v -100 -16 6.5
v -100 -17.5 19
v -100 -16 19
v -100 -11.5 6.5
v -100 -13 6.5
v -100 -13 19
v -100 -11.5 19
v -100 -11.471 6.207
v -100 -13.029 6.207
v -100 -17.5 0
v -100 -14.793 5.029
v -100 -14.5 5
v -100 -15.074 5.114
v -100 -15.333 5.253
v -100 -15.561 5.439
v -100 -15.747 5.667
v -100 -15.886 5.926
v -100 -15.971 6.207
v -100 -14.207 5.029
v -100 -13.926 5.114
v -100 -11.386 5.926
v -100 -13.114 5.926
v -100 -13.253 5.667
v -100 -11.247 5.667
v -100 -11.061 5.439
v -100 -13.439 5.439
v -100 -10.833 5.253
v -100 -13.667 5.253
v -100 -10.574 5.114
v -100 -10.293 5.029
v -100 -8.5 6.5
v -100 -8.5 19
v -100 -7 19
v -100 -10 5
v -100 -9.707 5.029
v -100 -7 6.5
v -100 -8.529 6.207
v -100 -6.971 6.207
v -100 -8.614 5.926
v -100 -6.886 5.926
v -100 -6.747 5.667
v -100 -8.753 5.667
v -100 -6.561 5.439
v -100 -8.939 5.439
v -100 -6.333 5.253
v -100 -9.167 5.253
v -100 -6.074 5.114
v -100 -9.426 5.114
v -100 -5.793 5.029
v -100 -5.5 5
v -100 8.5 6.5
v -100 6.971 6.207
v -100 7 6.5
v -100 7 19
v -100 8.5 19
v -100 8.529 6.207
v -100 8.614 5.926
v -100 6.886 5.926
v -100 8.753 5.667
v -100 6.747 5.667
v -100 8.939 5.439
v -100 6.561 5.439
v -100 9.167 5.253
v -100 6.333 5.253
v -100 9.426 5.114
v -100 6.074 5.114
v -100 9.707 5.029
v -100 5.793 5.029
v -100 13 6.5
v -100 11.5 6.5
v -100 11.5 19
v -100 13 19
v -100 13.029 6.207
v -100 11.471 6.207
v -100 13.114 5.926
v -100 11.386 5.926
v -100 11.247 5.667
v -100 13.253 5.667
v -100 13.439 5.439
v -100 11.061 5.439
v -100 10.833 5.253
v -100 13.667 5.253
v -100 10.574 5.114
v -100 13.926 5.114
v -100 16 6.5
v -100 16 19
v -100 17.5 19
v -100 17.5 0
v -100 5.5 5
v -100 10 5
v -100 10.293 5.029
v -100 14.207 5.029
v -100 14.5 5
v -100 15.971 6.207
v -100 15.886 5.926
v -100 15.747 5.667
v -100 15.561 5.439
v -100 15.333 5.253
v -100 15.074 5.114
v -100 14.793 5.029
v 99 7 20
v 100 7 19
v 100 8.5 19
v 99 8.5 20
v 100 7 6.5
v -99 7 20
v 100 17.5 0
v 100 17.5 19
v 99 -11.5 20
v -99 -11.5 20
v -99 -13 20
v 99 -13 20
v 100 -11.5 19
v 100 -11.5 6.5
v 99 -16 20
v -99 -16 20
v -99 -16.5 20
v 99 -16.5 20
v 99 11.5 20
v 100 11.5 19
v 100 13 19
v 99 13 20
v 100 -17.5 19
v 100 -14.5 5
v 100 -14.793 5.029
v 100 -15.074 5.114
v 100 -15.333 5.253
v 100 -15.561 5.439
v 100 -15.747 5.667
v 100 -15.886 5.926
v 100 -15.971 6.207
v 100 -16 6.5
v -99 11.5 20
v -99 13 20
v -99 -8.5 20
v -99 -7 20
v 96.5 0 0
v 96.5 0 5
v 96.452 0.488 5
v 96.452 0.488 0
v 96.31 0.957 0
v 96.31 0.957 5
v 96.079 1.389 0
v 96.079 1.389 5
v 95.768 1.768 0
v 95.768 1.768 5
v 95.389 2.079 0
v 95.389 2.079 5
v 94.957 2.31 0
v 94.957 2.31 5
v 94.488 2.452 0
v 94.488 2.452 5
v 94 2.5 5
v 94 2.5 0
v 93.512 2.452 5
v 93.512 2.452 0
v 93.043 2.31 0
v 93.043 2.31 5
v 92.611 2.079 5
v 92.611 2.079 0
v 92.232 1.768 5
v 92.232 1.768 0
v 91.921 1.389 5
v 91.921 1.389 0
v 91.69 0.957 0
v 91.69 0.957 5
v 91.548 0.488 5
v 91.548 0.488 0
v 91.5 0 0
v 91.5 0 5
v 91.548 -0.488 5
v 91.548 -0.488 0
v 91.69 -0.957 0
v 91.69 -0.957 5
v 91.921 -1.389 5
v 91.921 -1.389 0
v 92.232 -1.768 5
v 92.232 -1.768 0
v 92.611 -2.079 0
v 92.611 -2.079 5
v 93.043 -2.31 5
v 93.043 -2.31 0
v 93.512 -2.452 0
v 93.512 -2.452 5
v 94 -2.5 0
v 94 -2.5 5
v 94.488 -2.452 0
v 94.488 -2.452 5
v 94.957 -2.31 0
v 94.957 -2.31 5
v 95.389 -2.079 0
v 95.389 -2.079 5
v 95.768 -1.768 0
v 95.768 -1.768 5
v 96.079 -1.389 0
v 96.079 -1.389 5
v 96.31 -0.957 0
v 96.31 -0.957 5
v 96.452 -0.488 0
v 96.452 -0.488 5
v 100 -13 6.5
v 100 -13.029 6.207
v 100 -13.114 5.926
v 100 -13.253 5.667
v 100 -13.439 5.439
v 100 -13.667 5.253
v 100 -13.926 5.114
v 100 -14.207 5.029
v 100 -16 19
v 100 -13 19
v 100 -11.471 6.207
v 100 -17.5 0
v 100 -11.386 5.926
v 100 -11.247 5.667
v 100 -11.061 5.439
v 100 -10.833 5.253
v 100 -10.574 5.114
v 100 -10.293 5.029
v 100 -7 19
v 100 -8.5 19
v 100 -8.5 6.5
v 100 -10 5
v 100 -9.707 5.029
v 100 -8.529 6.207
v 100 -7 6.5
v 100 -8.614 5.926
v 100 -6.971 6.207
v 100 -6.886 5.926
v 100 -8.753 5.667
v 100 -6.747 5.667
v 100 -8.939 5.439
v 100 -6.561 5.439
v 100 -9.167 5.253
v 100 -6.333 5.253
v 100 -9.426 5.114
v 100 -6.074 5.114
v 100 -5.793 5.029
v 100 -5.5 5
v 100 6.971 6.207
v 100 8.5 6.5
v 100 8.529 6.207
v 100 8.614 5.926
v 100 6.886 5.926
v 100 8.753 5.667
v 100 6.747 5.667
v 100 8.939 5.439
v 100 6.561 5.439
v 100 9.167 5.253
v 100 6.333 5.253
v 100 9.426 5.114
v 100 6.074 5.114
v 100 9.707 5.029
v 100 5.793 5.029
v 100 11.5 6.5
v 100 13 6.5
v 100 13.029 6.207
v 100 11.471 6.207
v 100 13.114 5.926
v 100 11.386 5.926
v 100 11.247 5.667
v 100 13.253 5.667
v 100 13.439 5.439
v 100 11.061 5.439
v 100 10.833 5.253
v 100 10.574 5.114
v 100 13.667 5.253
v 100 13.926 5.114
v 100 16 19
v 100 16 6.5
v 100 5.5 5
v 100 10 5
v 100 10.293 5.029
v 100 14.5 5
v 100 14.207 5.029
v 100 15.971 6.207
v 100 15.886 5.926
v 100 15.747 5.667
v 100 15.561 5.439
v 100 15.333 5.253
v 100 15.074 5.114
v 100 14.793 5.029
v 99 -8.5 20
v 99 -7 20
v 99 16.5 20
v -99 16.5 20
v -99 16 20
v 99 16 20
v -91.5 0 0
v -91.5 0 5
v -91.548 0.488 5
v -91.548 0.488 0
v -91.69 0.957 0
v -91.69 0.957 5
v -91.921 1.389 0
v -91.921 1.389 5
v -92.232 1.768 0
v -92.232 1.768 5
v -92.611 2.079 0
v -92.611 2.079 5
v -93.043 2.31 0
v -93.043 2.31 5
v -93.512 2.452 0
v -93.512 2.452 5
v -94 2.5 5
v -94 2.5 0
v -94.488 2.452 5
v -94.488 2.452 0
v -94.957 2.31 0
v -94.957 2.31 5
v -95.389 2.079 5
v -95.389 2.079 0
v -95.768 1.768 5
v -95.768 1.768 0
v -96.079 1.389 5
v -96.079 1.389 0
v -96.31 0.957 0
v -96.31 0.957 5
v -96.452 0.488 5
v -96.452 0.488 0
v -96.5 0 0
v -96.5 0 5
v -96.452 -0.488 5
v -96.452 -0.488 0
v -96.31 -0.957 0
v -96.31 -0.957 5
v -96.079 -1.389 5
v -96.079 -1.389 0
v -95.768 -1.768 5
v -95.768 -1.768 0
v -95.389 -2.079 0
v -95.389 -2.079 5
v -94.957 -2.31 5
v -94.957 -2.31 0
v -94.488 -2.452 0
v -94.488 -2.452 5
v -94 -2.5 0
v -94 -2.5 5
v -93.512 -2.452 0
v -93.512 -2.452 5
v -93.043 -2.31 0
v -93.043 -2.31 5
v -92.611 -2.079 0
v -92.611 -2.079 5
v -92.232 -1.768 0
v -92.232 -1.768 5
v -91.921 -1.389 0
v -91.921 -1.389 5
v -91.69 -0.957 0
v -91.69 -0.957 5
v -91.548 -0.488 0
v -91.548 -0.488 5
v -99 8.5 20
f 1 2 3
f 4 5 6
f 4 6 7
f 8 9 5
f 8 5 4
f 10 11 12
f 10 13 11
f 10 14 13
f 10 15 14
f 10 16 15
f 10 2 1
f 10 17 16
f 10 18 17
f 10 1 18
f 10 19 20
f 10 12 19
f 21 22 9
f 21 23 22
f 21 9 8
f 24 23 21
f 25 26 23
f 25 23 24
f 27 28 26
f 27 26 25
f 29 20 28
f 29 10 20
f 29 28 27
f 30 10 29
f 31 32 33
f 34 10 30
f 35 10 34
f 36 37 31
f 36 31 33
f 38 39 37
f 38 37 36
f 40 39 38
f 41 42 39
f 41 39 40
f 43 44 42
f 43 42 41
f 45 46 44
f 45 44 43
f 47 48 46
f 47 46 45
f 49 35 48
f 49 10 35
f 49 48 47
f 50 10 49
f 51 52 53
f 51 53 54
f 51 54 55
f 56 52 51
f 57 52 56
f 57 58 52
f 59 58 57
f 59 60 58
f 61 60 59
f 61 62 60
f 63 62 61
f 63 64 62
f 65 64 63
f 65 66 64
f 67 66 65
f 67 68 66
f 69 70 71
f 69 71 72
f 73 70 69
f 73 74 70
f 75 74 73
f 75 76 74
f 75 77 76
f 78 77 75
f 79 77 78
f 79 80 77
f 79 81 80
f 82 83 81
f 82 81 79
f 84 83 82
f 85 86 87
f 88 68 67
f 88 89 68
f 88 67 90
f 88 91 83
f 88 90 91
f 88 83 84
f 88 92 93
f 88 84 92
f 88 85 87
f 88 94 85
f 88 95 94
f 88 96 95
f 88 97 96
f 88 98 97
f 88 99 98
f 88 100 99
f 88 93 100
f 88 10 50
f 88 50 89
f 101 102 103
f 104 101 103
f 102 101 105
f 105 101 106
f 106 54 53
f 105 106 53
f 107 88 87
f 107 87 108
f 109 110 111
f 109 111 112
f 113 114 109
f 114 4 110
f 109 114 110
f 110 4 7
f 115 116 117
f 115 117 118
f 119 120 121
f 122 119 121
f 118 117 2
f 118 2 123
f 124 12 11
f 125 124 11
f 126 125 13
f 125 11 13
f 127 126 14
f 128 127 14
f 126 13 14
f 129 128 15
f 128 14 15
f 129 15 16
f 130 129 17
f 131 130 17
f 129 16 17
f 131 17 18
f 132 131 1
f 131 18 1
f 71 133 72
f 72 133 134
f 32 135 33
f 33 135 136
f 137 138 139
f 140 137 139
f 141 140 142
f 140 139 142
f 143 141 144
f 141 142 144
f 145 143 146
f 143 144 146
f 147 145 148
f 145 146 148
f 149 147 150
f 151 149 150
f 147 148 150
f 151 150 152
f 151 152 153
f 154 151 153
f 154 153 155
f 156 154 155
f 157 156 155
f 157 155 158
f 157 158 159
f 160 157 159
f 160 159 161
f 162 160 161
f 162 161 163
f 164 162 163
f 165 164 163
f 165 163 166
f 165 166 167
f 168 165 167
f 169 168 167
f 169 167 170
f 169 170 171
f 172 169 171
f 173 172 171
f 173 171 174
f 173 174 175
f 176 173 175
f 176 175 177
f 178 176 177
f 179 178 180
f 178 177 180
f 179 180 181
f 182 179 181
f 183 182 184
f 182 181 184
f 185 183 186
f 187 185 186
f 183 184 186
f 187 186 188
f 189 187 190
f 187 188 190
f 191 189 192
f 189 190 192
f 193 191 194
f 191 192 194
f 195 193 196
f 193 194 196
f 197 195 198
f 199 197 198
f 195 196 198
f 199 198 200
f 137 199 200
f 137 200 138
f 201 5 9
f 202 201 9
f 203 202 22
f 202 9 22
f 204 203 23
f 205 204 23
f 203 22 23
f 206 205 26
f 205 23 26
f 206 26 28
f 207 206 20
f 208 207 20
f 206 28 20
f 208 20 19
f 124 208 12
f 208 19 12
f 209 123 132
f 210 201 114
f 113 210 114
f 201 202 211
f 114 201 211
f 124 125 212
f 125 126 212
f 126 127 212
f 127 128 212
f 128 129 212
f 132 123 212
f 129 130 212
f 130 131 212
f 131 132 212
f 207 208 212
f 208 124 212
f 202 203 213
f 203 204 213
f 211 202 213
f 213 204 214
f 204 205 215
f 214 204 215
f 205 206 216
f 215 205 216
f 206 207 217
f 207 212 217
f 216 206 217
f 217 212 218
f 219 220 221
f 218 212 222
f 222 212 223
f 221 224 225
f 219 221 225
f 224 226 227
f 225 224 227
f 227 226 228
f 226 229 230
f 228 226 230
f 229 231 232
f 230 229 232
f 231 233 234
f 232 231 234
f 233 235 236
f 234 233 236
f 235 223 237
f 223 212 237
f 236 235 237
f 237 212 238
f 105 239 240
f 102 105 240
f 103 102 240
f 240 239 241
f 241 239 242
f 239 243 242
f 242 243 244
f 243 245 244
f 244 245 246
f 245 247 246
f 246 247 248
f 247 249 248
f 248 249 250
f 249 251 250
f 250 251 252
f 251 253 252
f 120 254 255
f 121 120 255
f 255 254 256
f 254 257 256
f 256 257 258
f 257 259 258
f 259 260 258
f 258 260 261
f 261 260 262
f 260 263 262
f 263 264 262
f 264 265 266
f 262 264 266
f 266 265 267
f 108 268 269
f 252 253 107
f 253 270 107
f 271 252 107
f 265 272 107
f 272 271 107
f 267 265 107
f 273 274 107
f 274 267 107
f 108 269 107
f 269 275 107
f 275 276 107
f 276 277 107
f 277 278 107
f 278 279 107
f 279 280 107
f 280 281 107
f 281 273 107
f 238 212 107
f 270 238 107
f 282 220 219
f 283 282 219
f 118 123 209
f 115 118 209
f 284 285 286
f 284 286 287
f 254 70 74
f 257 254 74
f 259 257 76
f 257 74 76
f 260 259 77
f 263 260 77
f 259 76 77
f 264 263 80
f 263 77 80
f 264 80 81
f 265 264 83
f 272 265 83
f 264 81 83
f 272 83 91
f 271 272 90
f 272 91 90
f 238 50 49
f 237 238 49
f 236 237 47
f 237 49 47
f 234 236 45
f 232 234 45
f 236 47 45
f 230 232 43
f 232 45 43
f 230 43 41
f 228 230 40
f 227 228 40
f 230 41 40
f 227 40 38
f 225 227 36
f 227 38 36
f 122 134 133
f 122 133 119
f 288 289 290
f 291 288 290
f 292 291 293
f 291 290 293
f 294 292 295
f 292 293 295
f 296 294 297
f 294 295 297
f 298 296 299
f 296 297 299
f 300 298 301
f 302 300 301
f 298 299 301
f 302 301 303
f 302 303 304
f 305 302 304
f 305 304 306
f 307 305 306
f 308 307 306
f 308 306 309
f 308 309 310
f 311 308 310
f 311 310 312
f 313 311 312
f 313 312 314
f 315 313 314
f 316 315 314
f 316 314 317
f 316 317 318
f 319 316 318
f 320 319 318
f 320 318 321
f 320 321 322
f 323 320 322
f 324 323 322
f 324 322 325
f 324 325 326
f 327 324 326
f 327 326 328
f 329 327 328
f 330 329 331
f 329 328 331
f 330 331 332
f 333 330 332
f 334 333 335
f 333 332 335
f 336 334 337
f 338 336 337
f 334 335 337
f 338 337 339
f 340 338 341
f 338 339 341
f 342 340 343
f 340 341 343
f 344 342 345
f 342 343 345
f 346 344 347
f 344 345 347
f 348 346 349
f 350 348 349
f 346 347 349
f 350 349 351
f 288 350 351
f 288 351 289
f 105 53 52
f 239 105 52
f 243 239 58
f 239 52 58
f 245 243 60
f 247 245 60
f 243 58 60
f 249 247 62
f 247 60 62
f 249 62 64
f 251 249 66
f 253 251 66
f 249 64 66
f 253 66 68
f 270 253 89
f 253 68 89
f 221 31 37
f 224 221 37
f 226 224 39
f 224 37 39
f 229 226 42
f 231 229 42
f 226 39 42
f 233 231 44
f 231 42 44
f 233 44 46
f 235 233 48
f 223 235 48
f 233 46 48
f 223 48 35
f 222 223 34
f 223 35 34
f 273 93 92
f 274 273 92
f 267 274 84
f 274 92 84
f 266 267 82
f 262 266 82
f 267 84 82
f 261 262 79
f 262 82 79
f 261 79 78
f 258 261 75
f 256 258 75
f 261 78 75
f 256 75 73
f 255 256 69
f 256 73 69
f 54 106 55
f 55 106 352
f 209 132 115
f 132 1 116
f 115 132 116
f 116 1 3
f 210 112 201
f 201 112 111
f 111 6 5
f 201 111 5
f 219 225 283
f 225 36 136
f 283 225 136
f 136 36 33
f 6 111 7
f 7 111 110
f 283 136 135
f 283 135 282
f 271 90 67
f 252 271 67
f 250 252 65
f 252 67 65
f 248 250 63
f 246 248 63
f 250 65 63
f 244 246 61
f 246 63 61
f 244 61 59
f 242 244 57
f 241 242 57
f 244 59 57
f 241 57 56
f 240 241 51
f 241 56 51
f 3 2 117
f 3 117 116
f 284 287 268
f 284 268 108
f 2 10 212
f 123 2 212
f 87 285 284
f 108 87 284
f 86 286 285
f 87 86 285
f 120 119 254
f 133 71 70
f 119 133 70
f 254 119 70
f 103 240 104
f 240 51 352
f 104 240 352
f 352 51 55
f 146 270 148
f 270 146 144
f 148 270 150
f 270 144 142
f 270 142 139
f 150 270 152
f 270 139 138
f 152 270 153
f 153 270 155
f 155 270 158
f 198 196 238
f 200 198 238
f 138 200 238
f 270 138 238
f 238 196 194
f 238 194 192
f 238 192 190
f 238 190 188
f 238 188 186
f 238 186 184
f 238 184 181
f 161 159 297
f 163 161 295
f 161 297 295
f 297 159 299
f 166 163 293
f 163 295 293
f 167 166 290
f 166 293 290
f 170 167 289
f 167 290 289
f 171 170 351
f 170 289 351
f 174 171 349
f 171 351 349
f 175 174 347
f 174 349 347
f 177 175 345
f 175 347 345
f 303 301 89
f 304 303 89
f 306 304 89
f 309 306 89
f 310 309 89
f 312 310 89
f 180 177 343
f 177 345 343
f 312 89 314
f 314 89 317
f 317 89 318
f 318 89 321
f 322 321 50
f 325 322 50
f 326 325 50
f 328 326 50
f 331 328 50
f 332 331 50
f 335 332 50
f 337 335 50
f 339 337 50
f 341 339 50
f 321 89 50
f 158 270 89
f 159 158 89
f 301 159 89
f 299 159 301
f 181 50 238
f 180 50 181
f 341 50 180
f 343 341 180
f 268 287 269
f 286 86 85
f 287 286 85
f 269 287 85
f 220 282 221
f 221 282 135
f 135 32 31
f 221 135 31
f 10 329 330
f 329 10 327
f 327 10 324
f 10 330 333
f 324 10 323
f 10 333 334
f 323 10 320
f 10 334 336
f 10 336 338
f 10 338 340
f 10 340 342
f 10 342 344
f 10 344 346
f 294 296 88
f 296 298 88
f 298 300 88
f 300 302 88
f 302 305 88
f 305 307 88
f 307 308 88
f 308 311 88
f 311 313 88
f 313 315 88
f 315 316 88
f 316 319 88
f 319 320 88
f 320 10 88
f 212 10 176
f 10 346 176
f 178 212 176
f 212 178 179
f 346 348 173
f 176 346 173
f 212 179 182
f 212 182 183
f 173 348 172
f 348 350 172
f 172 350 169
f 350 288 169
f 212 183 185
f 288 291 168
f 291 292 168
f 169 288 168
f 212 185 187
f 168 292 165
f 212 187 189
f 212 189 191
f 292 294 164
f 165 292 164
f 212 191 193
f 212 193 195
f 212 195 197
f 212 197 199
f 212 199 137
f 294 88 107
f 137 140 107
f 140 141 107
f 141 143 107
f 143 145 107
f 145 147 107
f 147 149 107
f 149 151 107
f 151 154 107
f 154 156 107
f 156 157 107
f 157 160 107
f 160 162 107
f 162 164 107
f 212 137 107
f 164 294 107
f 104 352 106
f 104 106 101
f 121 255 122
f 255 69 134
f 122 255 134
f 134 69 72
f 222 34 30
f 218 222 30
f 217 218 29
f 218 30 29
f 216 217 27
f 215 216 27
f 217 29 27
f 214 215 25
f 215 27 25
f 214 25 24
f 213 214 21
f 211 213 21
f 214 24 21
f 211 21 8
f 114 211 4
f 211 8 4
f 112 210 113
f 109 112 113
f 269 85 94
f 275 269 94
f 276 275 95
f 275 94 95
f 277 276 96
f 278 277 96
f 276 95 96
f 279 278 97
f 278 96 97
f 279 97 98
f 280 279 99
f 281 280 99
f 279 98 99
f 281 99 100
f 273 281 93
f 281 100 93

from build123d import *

# Parameters (mm, degrees)
F0_W     = 200
F0_H     = 35
F1_DEPTH = 20
F2_R     = 2.5
F3_DEPTH = 25
F4_SIZE  = 1
F6_DEPTH = 240
F8_DEPTH = 250


with BuildPart() as f1:
    # F0 (on Top) → F1 (new body)
    with BuildSketch(Plane.XY):
        Rectangle(F0_W, F0_H)
    extrude(amount=F1_DEPTH)

    # F2 (on face) → F3 (cut)
    with BuildSketch(Plane.XY.offset(20)):
        with Locations((-94, 0)):
            Circle(F2_R)
        with Locations((94, 0)):
            Circle(F2_R)
    extrude(amount=-F3_DEPTH, mode=Mode.SUBTRACT)

    # F4
    f4_edges = [f1.edges().sort_by_distance(p)[0] for p in [
        (0, 17.5, 20),
        (100, 0, 20),
        (-100, 0, 20),
        (0, -17.5, 20),
        (-96.5, 0, 20),
        (91.5, 0, 20),
    ]]
    chamfer(f4_edges, length=F4_SIZE)

    # F5 (on face) → F6 (cut)
    with BuildSketch(Plane(origin=(-100, 0, 0), x_dir=(0, -1, 0), z_dir=(-1, 0, 0))):
        with BuildLine():
            Line((-13, 21.054447), (-16, 21.054447))
            Line((-16, 21.054447), (-16, 6.5))
            ThreePointArc((-16, 6.5), (-15.56066, 5.43934), (-14.5, 5))
            ThreePointArc((-14.5, 5), (-13.43934, 5.43934), (-13, 6.5))
            Line((-13, 6.5), (-13, 21.054447))
        make_face()
        with BuildLine():
            Line((-8.5, 21.054447), (-11.5, 21.054447))
            Line((-11.5, 21.054447), (-11.5, 6.5))
            ThreePointArc((-11.5, 6.5), (-11.06066, 5.43934), (-10, 5))
            ThreePointArc((-10, 5), (-8.93934, 5.43934), (-8.5, 6.5))
            Line((-8.5, 6.5), (-8.5, 21.054447))
        make_face()
        with BuildLine():
            Line((-4, 20.95042), (-7, 20.95042))
            Line((-7, 20.95042), (-7, 6.5))
            ThreePointArc((-7, 6.5), (-6.56066, 5.43934), (-5.5, 5))
            ThreePointArc((-5.5, 5), (-4.43934, 5.43934), (-4, 6.5))
            Line((-4, 6.5), (-4, 20.95042))
        make_face()
        with BuildLine():
            Line((11.5, 21.002434), (8.5, 21.002434))
            Line((8.5, 21.002434), (8.5, 6.5))
            ThreePointArc((8.5, 6.5), (8.93934, 5.43934), (10, 5))
            ThreePointArc((10, 5), (11.06066, 5.43934), (11.5, 6.5))
            Line((11.5, 6.5), (11.5, 21.002434))
        make_face()
        with BuildLine():
            Line((16, 21.002434), (13, 21.002434))
            Line((13, 21.002434), (13, 6.5))
            ThreePointArc((13, 6.5), (13.43934, 5.43934), (14.5, 5))
            ThreePointArc((14.5, 5), (15.56066, 5.43934), (16, 6.5))
            Line((16, 6.5), (16, 21.002434))
        make_face()
        with BuildLine():
            Line((7, 21.002434), (4, 21.002434))
            Line((4, 21.002434), (4, 6.5))
            ThreePointArc((4, 6.5), (4.43934, 5.43934), (5.5, 5))
            ThreePointArc((5.5, 5), (6.56066, 5.43934), (7, 6.5))
            Line((7, 6.5), (7, 21.002434))
        make_face()
    extrude(amount=-F6_DEPTH, mode=Mode.SUBTRACT)

    # F7 (on face) → F8 (cut)
    with BuildSketch(Plane(origin=(-100, 0, 0), x_dir=(0, -1, 0), z_dir=(-1, 0, 0))):
        with BuildLine():
            ThreePointArc((-4, 6.5), (-4.43934, 5.43934), (-5.5, 5))
            Line((-5.5, 5), (5.5, 5))
            ThreePointArc((5.5, 5), (4.43934, 5.43934), (4, 6.5))
            Line((4, 6.5), (4, 19))
            Line((4, 19), (-4, 19))
            Line((-4, 19), (-4, 6.5))
        make_face()
        with BuildLine():
            Line((5.5, 21.402081), (-5.5, 21.402081))
            Line((-5.5, 21.402081), (-5.5, 5))
            ThreePointArc((-5.5, 5), (-4.43934, 5.43934), (-4, 6.5))
            Line((-4, 6.5), (-4, 19))
            Line((-4, 19), (4, 19))
            Line((4, 19), (4, 6.5))
            ThreePointArc((4, 6.5), (4.43934, 5.43934), (5.5, 5))
            Line((5.5, 5), (5.5, 21.402081))
        make_face()
    extrude(amount=-F8_DEPTH, mode=Mode.SUBTRACT)


solid = f1.part
